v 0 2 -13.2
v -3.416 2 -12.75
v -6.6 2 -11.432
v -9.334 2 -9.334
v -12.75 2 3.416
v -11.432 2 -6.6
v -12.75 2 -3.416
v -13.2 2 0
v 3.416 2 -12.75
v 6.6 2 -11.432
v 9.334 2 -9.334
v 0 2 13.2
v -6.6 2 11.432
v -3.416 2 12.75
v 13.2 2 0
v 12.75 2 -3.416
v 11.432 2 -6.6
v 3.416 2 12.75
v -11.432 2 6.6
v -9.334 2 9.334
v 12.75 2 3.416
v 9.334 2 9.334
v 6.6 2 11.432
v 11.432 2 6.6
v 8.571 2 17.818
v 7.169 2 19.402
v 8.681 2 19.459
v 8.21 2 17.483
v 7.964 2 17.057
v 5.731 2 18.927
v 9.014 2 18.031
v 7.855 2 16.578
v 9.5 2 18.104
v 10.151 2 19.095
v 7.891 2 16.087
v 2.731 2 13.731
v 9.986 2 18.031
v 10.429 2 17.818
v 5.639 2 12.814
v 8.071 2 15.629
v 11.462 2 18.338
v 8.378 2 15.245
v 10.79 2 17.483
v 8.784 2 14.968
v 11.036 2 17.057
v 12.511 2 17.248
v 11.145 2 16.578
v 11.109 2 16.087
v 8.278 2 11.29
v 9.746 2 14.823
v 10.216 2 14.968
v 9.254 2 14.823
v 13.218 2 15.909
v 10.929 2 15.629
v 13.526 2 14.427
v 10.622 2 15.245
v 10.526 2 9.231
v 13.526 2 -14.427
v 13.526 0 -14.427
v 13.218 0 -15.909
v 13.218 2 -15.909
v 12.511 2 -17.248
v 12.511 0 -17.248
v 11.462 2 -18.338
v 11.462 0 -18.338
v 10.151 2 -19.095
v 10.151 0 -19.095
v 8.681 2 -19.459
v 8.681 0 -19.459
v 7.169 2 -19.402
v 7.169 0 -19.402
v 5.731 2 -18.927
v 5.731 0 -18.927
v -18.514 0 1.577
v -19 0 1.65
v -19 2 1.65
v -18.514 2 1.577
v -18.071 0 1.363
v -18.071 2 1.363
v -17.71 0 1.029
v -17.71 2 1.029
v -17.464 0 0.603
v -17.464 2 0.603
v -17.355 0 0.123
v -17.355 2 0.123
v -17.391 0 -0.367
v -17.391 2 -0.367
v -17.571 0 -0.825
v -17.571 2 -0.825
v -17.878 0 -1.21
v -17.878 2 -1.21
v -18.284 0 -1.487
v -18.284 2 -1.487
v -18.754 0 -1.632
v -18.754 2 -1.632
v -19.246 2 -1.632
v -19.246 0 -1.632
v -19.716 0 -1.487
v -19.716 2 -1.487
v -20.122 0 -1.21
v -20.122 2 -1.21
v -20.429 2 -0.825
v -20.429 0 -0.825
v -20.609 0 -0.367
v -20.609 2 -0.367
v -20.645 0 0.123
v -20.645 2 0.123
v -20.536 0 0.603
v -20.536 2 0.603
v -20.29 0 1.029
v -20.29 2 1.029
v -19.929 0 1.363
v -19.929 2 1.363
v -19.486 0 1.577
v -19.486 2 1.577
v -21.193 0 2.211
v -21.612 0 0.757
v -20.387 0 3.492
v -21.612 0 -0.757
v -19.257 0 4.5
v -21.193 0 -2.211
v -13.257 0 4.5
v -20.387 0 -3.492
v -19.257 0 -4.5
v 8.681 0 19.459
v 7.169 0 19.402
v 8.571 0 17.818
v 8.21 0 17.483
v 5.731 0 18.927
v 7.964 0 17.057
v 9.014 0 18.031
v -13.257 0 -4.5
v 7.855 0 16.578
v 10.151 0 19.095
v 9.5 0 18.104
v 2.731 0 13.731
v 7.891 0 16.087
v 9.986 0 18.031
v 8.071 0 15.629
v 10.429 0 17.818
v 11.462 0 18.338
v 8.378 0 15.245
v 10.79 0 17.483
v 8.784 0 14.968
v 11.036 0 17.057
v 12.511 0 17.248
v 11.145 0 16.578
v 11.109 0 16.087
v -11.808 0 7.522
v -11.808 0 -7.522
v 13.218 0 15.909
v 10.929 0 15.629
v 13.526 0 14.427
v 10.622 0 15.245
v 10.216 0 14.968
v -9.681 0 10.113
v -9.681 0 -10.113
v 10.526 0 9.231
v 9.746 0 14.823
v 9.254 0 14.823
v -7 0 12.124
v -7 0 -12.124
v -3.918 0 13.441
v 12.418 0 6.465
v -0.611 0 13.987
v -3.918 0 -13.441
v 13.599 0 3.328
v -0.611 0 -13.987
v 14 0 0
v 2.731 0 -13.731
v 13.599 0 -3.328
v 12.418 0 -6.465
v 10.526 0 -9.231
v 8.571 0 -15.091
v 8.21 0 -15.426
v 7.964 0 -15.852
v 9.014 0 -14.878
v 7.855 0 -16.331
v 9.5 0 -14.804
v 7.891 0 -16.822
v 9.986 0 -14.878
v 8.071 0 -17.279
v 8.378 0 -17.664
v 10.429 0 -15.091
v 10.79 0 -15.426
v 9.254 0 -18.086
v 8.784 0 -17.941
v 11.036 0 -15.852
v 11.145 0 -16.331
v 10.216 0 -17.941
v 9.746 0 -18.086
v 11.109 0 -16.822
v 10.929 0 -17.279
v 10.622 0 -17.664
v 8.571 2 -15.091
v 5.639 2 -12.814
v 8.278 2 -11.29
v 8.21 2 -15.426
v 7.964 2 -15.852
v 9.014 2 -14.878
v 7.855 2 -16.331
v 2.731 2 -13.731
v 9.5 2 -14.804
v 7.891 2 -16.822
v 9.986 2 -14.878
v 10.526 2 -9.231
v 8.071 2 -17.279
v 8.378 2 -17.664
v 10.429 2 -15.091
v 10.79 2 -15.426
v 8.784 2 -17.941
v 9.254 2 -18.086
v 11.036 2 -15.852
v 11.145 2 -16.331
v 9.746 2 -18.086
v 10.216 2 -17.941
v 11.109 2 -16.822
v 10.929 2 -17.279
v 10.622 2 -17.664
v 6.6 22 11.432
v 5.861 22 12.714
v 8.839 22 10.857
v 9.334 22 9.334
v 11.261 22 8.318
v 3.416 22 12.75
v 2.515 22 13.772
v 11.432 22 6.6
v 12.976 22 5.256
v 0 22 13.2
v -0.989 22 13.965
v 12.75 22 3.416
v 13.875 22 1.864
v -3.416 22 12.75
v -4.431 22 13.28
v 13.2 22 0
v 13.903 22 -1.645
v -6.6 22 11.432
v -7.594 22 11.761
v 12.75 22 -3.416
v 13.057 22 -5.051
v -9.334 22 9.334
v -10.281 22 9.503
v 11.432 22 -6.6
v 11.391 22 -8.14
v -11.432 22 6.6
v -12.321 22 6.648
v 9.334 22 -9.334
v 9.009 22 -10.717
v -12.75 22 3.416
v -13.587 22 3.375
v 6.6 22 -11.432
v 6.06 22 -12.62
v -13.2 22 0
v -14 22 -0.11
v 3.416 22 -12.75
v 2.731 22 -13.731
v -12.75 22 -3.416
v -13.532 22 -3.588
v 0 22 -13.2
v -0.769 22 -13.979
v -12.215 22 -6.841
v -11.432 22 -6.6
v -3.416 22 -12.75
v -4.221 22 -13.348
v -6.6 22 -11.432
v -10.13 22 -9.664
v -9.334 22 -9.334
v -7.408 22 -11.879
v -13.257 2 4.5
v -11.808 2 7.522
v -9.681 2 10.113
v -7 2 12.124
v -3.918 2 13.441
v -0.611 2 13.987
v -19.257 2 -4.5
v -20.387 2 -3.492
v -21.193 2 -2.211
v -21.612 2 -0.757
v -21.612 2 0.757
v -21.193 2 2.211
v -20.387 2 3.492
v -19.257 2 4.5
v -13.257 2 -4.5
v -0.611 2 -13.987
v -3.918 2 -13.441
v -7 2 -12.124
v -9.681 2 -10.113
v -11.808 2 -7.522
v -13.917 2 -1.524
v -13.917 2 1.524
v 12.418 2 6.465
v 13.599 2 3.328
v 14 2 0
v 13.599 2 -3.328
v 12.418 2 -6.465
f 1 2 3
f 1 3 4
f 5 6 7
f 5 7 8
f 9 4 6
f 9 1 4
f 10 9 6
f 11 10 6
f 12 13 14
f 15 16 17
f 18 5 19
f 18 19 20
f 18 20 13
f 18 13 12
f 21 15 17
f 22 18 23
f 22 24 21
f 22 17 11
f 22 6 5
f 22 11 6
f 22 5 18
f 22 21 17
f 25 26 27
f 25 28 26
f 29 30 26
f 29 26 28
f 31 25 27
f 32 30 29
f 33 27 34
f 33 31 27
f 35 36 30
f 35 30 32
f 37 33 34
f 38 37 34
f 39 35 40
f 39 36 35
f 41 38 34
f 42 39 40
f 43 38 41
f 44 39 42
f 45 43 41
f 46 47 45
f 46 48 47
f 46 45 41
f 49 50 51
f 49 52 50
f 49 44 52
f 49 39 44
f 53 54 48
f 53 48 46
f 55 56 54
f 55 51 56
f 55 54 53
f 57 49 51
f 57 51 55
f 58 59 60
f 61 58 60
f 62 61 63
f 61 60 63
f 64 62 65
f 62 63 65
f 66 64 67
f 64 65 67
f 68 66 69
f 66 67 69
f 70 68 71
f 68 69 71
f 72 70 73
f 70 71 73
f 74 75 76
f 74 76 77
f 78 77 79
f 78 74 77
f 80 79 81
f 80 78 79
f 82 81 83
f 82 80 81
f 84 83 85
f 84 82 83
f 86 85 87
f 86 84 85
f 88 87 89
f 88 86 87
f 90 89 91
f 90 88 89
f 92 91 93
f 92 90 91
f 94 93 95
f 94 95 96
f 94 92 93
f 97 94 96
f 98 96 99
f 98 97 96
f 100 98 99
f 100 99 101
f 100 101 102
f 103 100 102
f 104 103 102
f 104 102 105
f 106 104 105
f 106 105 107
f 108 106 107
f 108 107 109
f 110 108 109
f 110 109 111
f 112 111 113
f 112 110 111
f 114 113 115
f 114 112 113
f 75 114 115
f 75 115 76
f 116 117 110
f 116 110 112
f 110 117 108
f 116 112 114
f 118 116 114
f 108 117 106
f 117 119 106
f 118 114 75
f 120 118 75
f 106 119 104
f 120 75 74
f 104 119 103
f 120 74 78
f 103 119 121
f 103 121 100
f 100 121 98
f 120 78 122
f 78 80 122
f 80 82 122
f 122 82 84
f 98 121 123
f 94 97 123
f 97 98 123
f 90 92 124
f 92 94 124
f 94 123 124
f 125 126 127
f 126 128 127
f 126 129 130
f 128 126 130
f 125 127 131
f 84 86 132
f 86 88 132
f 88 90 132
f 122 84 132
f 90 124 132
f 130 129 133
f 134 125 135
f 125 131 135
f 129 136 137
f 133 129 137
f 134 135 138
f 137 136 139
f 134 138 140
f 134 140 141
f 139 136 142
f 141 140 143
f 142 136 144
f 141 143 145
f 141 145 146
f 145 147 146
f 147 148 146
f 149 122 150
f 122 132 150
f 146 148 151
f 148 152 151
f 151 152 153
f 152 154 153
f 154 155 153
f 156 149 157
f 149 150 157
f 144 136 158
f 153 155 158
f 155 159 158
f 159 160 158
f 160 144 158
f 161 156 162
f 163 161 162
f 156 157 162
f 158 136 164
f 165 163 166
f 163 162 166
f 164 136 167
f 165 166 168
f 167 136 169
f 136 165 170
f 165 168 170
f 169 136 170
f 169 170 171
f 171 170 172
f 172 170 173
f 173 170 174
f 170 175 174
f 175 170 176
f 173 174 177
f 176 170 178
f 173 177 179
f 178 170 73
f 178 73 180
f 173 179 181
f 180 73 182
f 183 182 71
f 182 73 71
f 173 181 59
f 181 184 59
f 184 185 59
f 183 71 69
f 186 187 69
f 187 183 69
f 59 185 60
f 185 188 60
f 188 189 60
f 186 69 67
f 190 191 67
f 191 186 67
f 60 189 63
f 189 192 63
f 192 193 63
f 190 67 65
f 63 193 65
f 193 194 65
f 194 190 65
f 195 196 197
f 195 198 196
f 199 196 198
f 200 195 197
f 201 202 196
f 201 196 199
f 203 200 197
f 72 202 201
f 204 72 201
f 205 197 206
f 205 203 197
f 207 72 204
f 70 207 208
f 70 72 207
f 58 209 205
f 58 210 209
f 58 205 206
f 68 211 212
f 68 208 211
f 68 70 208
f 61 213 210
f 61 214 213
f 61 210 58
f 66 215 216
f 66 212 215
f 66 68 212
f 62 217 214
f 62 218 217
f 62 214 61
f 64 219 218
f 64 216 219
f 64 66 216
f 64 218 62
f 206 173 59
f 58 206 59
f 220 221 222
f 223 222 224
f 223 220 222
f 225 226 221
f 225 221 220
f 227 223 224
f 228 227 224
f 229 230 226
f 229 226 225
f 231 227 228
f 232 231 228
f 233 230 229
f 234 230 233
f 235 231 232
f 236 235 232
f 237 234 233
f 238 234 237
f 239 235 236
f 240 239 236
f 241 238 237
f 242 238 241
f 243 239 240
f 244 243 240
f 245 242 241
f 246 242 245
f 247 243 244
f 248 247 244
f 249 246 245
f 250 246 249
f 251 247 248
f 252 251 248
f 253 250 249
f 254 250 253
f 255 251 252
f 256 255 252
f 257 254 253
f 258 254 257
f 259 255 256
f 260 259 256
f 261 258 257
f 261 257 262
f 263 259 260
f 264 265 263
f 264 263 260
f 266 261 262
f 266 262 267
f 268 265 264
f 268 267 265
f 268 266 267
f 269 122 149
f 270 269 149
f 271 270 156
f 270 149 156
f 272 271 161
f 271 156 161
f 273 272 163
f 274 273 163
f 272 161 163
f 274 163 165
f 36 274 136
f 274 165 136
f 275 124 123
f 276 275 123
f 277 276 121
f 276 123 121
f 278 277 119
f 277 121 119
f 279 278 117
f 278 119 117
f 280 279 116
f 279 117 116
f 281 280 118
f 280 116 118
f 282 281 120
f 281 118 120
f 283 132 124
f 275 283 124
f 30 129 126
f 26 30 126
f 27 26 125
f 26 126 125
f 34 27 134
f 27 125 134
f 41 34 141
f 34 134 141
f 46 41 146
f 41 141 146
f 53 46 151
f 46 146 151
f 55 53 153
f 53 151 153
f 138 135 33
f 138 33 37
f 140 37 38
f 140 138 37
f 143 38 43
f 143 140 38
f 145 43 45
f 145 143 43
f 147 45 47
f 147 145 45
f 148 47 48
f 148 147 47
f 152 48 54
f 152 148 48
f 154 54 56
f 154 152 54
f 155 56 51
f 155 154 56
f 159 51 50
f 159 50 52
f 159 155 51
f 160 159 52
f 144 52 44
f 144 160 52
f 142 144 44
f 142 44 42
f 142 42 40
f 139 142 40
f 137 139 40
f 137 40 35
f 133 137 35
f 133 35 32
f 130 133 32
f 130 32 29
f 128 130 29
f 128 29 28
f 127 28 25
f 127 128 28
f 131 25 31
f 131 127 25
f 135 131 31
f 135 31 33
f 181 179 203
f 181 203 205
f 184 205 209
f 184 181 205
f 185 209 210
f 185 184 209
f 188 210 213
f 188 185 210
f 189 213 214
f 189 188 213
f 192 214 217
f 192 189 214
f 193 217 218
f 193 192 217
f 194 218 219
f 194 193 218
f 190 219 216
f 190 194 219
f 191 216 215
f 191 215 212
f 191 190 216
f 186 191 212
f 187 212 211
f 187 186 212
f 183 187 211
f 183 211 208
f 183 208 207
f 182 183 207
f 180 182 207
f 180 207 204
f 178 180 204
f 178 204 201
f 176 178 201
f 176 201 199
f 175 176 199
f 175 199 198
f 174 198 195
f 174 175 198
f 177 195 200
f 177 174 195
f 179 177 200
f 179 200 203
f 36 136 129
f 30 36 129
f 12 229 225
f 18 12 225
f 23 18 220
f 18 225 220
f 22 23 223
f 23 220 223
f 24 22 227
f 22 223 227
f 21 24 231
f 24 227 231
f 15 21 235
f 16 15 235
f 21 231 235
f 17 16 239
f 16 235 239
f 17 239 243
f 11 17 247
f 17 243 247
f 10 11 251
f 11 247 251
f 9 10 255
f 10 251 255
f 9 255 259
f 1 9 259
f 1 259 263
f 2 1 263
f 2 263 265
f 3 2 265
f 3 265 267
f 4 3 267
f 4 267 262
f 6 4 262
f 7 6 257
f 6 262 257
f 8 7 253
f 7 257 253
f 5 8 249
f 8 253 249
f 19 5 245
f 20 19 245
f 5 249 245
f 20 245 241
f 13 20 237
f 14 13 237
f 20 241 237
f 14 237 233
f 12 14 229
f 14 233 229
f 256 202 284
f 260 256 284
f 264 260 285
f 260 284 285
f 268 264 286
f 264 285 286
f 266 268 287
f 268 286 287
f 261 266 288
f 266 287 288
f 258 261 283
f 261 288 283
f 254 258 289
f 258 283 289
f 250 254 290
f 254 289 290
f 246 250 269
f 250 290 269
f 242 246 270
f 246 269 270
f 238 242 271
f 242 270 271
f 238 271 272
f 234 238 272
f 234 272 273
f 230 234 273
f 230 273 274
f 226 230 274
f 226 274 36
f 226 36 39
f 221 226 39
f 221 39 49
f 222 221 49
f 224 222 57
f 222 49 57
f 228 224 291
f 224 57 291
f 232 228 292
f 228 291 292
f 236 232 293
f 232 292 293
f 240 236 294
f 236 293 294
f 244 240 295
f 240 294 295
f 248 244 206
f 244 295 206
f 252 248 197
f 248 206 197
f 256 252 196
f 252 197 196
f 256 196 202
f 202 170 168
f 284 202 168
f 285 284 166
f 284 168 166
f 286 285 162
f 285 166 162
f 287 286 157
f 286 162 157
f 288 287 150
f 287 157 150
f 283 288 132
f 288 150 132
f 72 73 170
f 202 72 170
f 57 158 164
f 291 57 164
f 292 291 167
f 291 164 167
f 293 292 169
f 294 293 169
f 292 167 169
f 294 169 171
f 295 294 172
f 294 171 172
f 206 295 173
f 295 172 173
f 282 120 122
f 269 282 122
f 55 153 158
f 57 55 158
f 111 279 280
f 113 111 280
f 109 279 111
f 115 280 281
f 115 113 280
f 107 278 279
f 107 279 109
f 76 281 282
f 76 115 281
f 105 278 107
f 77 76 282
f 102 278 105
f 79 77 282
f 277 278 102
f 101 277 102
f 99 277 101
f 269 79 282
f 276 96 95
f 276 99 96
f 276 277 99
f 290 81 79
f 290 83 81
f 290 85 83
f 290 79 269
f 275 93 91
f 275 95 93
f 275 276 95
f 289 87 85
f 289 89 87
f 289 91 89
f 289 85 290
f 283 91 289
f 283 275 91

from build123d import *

# Parameters (mm, degrees)
ESBO_O4_R                = 1.65
RESSALTO_EXTRUS_O2_DEPTH = 2
ESBO_O5_R                = 14
RESSALTO_EXTRUS_O3_DEPTH = 20
ESBO_O6_R                = 13.2
CORTE_EXTRUS_O1_DEPTH    = 20


with BuildPart() as part:
    # Esboço4 → Ressalto-extrusão2 (new body)
    with BuildSketch(Plane(origin=(0, 0, 0), x_dir=(1, 0, 0), z_dir=(0, 1, 0))):
        with BuildLine():
            Line((-19.257073584, -4.5), (-13.257073584, -4.5))
            ThreePointArc((-13.257073584, -4.5), (-7, -12.124355653), (2.731422475, -13.730962503))
            Line((2.731422475, -13.730962503), (5.731422475, -18.927114926))
            ThreePointArc((5.731422475, -18.927114926), (10.832700248, -18.762787213), (13.525651109, -14.427114926))
            Line((13.525651109, -14.427114926), (10.525651109, -9.230962503))
            ThreePointArc((10.525651109, -9.230962503), (14, 0), (10.525651109, 9.230962503))
            Line((10.525651109, 9.230962503), (13.525651109, 14.427114926))
            ThreePointArc((13.525651109, 14.427114926), (10.832700248, 18.762787213), (5.731422475, 18.927114926))
            Line((5.731422475, 18.927114926), (2.731422475, 13.730962503))
            ThreePointArc((2.731422475, 13.730962503), (-7, 12.124355653), (-13.257073584, 4.5))
            Line((-13.257073584, 4.5), (-19.257073584, 4.5))
            ThreePointArc((-19.257073584, 4.5), (-21.665400497, 0), (-19.257073584, -4.5))
        make_face()
        with Locations(Location((-19, 0, 0), (0, 0, 270))):
            Circle(ESBO_O4_R, mode=Mode.SUBTRACT)
        with Locations(Location((9.5, 16.454482672, 0), (0, 0, 270))):
            Circle(ESBO_O4_R, mode=Mode.SUBTRACT)
        with Locations(Location((9.5, -16.454482672, 0), (0, 0, 270))):
            Circle(ESBO_O4_R, mode=Mode.SUBTRACT)
    extrude(amount=RESSALTO_EXTRUS_O2_DEPTH)

    # Esboço5 → Ressalto-extrusão3 (add)
    with BuildSketch(Plane(origin=(0, 2, 0), x_dir=(1, 0, 0), z_dir=(0, 1, 0))):
        with Locations(Location((0, 0, 0), (0, 0, 78.749340847))):
            Circle(ESBO_O5_R)
    extrude(amount=RESSALTO_EXTRUS_O3_DEPTH)

    # Esboço6 → Corte-extrusão1 (cut)
    with BuildSketch(Plane(origin=(0, 22, 0), x_dir=(1, 0, 0), z_dir=(0, 1, 0))):
        with Locations(Location((0, 0, 0), (0, 0, 270))):
            Circle(ESBO_O6_R)
    extrude(amount=-CORTE_EXTRUS_O1_DEPTH, mode=Mode.SUBTRACT)


solid = part.part
